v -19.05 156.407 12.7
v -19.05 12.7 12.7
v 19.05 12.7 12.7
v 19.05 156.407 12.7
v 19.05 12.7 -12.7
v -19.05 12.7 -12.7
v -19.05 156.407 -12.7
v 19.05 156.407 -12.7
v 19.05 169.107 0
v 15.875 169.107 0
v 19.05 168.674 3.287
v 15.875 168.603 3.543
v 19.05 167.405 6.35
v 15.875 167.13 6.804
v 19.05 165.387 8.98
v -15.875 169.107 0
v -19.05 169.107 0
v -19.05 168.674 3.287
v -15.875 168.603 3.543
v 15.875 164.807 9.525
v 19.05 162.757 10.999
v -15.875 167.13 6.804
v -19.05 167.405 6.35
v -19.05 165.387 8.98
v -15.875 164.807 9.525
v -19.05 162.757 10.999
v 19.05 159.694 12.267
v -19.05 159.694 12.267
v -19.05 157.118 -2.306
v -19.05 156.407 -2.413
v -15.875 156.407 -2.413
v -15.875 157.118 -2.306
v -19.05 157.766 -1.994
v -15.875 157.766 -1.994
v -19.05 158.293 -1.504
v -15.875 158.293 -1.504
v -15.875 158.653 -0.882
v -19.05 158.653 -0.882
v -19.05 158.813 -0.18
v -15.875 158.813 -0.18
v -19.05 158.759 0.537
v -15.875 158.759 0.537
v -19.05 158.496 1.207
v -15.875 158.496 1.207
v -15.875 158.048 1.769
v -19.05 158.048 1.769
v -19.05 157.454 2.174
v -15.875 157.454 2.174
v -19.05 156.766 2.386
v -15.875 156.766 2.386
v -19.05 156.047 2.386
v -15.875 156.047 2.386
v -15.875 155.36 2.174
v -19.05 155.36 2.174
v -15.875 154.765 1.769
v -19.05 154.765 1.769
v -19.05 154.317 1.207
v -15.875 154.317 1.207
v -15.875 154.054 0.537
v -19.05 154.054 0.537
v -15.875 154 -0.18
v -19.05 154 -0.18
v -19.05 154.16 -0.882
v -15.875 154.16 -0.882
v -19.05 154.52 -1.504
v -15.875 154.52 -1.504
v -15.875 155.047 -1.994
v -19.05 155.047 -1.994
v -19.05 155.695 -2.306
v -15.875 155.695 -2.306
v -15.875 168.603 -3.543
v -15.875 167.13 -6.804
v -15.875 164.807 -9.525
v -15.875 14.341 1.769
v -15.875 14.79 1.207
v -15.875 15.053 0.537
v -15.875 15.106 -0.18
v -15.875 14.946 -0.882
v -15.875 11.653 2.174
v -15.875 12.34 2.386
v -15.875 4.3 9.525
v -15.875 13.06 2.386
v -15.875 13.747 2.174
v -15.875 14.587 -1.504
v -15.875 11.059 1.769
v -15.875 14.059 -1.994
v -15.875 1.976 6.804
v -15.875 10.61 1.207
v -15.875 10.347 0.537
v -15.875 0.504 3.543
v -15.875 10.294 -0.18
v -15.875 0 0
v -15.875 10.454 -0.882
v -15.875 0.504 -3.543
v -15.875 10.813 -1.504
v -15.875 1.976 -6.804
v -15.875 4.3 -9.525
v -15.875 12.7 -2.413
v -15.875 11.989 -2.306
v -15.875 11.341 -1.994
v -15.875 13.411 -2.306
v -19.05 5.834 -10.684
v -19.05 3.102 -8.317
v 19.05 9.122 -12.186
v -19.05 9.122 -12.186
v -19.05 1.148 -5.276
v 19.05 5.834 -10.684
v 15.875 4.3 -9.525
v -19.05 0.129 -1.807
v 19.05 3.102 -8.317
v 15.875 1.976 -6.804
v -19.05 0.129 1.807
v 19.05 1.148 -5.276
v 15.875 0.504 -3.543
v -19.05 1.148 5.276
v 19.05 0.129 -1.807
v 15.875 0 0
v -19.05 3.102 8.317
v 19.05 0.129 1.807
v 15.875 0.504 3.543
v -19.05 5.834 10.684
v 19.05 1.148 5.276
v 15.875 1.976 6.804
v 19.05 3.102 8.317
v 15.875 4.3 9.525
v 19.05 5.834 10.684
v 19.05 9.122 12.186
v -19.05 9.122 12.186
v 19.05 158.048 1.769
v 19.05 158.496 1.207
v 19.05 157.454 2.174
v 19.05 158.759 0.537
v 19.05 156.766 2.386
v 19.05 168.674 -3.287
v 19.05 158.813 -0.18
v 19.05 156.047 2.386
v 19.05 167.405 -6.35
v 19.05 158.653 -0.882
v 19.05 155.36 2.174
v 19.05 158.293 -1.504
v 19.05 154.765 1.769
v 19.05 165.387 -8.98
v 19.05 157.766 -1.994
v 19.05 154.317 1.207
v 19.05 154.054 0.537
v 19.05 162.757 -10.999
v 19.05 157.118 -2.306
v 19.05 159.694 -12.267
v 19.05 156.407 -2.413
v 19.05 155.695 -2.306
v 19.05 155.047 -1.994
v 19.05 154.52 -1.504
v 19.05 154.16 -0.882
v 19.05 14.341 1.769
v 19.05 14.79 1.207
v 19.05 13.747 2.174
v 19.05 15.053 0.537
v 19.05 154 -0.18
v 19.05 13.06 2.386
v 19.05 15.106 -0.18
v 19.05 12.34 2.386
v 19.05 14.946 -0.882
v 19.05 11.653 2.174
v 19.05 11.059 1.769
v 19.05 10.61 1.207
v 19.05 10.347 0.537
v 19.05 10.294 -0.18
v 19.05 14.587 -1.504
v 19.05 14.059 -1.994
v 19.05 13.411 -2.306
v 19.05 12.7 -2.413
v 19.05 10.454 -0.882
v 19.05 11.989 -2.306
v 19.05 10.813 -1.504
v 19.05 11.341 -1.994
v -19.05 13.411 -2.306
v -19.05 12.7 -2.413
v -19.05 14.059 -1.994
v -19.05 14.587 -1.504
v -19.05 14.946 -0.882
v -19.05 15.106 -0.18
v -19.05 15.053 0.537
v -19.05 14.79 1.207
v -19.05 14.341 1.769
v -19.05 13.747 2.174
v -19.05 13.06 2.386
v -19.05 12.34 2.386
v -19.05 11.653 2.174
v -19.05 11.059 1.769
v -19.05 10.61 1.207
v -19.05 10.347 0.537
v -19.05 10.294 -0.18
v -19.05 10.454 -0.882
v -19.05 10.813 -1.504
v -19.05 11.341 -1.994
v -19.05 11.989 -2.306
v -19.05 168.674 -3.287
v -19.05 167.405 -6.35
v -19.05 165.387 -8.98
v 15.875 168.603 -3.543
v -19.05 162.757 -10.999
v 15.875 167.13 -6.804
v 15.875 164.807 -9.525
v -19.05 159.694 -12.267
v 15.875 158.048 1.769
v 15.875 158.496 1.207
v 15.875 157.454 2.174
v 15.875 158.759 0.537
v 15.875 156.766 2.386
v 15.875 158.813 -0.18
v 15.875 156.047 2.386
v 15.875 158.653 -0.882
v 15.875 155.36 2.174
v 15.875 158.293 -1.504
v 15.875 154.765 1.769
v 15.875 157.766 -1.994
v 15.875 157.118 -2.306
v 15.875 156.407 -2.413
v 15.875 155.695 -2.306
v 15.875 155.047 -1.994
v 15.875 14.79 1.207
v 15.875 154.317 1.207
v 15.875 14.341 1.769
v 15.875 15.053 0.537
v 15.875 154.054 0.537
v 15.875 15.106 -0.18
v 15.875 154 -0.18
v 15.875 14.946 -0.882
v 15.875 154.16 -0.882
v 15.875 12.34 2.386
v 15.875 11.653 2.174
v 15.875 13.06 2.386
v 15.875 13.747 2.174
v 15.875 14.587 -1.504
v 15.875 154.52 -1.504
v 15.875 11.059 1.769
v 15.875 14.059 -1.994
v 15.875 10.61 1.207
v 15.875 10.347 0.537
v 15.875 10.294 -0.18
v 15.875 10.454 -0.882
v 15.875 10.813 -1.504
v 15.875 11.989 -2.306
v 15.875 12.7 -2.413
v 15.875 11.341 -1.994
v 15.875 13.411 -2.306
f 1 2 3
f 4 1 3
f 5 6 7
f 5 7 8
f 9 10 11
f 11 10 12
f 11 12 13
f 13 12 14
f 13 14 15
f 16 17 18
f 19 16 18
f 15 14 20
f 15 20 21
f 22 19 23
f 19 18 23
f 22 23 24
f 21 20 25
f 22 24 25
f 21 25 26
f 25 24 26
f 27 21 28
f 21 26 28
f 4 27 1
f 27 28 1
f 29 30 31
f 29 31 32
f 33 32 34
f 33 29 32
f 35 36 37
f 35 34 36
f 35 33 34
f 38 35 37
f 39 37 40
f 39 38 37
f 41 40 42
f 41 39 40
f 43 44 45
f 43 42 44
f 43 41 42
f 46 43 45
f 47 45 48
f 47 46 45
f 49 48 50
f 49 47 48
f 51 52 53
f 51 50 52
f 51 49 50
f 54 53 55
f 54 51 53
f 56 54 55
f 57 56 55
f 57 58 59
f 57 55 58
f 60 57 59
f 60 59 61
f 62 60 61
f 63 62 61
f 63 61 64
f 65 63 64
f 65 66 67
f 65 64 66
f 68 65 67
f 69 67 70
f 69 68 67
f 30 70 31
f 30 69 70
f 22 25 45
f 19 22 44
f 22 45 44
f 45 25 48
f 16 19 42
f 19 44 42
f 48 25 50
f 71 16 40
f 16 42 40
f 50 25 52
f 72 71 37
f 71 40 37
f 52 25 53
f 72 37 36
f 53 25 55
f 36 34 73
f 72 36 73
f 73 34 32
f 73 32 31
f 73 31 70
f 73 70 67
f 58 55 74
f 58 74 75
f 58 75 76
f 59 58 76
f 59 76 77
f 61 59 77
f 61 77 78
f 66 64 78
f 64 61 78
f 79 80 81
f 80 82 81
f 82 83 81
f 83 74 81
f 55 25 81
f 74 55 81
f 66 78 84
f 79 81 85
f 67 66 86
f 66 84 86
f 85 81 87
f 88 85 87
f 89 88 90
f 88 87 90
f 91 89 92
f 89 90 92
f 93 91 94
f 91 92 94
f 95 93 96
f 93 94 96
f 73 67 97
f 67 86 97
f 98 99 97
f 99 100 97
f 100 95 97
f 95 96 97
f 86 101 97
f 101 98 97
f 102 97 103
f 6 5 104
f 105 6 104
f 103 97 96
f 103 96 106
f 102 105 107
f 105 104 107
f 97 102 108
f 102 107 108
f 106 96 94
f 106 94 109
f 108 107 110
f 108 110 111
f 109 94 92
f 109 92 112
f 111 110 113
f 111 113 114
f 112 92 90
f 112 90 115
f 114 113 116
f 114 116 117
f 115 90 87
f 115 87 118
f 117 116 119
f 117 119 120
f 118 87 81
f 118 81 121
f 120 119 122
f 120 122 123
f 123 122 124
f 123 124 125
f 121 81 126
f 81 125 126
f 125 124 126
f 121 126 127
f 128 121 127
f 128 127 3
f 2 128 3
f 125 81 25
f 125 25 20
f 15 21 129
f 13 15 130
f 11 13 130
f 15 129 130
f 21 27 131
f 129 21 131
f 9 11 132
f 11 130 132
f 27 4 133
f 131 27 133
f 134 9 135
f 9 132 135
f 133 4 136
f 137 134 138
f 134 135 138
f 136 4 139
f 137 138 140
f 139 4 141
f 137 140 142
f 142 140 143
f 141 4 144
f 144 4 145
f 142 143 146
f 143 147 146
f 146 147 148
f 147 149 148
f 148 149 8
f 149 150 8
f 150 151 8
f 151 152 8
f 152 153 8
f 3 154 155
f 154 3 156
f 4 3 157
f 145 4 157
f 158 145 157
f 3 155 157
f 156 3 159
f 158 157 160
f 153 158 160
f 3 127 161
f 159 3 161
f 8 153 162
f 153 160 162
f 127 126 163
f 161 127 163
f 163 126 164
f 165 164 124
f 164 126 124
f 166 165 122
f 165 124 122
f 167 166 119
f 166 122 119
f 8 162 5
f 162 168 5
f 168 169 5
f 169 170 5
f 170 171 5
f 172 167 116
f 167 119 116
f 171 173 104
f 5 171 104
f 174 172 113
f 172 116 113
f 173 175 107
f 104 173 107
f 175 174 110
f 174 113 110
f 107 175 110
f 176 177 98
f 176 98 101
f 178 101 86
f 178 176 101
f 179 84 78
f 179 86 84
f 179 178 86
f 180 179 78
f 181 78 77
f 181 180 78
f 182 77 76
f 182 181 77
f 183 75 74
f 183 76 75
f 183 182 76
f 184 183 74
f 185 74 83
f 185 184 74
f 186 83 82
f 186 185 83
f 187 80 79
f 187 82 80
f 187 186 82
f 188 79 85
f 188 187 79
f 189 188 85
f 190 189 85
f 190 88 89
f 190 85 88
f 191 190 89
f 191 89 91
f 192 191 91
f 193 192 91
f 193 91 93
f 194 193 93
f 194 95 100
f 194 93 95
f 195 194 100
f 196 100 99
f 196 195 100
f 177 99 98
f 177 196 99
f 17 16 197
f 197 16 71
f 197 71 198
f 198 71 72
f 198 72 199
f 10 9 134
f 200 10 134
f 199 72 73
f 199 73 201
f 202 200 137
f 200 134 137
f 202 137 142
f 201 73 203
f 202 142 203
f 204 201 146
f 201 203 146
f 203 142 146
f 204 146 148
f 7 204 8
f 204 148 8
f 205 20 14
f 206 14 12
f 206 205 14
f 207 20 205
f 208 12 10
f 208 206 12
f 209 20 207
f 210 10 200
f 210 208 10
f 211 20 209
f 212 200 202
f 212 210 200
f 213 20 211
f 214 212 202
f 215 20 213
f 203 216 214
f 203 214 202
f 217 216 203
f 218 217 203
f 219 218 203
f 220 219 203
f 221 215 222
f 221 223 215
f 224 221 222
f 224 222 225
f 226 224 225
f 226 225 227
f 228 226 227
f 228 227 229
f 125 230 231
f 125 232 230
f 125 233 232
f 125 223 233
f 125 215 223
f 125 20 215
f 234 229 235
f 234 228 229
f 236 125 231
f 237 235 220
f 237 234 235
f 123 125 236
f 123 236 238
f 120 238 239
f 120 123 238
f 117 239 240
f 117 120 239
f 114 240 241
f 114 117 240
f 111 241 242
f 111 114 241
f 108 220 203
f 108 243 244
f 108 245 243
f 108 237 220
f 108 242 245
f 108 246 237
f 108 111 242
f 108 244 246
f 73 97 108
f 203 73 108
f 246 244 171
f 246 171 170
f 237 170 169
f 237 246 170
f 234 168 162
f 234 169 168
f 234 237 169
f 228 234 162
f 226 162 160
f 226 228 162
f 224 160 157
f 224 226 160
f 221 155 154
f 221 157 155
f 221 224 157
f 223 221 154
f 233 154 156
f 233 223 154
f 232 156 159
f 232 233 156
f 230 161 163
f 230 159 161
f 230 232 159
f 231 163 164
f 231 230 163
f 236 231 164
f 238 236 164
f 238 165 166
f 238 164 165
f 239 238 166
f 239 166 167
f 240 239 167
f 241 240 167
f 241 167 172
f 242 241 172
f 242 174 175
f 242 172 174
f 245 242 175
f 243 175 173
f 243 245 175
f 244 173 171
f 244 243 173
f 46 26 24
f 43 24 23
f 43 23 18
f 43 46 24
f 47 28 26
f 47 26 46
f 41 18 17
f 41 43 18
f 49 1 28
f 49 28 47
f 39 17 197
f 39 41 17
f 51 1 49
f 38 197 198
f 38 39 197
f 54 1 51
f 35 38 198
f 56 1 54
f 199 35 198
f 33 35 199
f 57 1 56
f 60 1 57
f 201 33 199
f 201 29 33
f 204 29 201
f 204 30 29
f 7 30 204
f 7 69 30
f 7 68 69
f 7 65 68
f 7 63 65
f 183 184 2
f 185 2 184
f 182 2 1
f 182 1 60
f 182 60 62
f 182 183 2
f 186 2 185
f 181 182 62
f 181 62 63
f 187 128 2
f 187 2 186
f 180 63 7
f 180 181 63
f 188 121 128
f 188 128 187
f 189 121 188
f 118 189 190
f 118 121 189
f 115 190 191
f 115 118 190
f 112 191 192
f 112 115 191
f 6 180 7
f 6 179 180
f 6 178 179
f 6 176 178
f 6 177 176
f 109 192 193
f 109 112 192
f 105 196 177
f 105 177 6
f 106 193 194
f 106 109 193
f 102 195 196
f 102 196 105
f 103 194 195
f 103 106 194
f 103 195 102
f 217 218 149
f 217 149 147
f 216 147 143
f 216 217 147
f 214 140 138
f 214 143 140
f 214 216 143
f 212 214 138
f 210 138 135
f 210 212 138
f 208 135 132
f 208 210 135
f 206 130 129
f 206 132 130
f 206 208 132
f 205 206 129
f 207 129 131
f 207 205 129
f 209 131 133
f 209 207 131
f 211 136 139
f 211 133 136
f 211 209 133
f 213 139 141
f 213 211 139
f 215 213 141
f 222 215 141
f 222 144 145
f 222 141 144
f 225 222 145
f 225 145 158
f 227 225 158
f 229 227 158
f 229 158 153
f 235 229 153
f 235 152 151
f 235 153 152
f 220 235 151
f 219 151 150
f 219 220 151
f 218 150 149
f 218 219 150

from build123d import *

# Parameters (mm, degrees)
SKETCH1_W               = 38.1
SKETCH1_H               = 25.4
SKETCH1_W_2             = 31.75
SKETCH1_H_2             = 19.05
BOSS_EXTRUDE1_DEPTH     = 169.106596
CUT_EXTRUDE1_DEPTH      = 174.810071085
CUT_EXTRUDE1_DEPTH_BACK = 174.810071085
SKETCH2_R               = 2.413
FILLET7_R               = 12.7


with BuildPart() as part:
    # Sketch1 → Boss-Extrude1 (new body)
    with BuildSketch(Plane(origin=(0, 0, 0), x_dir=(1, 0, 0), z_dir=(0, 1, 0))):
        Rectangle(SKETCH1_W, SKETCH1_H)
        Rectangle(SKETCH1_W_2, SKETCH1_H_2, mode=Mode.SUBTRACT)
    extrude(amount=BOSS_EXTRUDE1_DEPTH)

    # Sketch2 → Cut-Extrude1 (cut, two sides: drawn at the far end of the back side and taken through both)
    with BuildSketch(Plane(origin=(19.05, 0, 0), x_dir=(0, 0, -1), z_dir=(1, 0, 0)).offset(-CUT_EXTRUDE1_DEPTH_BACK)):
        with Locations((0, 156.406596)):
            Circle(SKETCH2_R)
        with Locations((0, 12.7)):
            Circle(SKETCH2_R)
    extrude(amount=CUT_EXTRUDE1_DEPTH + CUT_EXTRUDE1_DEPTH_BACK, mode=Mode.SUBTRACT)

    # Fillet7
    # the kernel refuses this fillet: 12.7 mm, written as the material it takes off along each edge
    with BuildSketch(Plane(origin=(50.8, 169.106596, -12.7), x_dir=(0, 0, 1), z_dir=(-1, 0, 0)), Plane(origin=(-50.8, 0, 12.7), x_dir=(0, 1, 0), z_dir=(1, 0, 0))) as fillet7_piece_1:
        with BuildLine():
            CenterArc((FILLET7_R, -FILLET7_R), FILLET7_R, 90, 90)
            Line((0, -FILLET7_R), (0, 0))
            Line((0, 0), (FILLET7_R, 0))
        make_face()
    extrude(amount=101.6, mode=Mode.SUBTRACT)
    with BuildSketch(Plane(origin=(50.8, 0, -12.7), x_dir=(0, 0, 1), z_dir=(-1, 0, 0)), Plane(origin=(-50.8, 169.106596, 12.7), x_dir=(0, -1, 0), z_dir=(1, 0, 0))) as fillet7_piece_2:
        with BuildLine():
            CenterArc((FILLET7_R, FILLET7_R), FILLET7_R, 180, 90)
            Line((0, FILLET7_R), (0, 0))
            Line((0, 0), (FILLET7_R, 0))
        make_face()
    extrude(amount=101.6, mode=Mode.SUBTRACT)


solid = part.part
